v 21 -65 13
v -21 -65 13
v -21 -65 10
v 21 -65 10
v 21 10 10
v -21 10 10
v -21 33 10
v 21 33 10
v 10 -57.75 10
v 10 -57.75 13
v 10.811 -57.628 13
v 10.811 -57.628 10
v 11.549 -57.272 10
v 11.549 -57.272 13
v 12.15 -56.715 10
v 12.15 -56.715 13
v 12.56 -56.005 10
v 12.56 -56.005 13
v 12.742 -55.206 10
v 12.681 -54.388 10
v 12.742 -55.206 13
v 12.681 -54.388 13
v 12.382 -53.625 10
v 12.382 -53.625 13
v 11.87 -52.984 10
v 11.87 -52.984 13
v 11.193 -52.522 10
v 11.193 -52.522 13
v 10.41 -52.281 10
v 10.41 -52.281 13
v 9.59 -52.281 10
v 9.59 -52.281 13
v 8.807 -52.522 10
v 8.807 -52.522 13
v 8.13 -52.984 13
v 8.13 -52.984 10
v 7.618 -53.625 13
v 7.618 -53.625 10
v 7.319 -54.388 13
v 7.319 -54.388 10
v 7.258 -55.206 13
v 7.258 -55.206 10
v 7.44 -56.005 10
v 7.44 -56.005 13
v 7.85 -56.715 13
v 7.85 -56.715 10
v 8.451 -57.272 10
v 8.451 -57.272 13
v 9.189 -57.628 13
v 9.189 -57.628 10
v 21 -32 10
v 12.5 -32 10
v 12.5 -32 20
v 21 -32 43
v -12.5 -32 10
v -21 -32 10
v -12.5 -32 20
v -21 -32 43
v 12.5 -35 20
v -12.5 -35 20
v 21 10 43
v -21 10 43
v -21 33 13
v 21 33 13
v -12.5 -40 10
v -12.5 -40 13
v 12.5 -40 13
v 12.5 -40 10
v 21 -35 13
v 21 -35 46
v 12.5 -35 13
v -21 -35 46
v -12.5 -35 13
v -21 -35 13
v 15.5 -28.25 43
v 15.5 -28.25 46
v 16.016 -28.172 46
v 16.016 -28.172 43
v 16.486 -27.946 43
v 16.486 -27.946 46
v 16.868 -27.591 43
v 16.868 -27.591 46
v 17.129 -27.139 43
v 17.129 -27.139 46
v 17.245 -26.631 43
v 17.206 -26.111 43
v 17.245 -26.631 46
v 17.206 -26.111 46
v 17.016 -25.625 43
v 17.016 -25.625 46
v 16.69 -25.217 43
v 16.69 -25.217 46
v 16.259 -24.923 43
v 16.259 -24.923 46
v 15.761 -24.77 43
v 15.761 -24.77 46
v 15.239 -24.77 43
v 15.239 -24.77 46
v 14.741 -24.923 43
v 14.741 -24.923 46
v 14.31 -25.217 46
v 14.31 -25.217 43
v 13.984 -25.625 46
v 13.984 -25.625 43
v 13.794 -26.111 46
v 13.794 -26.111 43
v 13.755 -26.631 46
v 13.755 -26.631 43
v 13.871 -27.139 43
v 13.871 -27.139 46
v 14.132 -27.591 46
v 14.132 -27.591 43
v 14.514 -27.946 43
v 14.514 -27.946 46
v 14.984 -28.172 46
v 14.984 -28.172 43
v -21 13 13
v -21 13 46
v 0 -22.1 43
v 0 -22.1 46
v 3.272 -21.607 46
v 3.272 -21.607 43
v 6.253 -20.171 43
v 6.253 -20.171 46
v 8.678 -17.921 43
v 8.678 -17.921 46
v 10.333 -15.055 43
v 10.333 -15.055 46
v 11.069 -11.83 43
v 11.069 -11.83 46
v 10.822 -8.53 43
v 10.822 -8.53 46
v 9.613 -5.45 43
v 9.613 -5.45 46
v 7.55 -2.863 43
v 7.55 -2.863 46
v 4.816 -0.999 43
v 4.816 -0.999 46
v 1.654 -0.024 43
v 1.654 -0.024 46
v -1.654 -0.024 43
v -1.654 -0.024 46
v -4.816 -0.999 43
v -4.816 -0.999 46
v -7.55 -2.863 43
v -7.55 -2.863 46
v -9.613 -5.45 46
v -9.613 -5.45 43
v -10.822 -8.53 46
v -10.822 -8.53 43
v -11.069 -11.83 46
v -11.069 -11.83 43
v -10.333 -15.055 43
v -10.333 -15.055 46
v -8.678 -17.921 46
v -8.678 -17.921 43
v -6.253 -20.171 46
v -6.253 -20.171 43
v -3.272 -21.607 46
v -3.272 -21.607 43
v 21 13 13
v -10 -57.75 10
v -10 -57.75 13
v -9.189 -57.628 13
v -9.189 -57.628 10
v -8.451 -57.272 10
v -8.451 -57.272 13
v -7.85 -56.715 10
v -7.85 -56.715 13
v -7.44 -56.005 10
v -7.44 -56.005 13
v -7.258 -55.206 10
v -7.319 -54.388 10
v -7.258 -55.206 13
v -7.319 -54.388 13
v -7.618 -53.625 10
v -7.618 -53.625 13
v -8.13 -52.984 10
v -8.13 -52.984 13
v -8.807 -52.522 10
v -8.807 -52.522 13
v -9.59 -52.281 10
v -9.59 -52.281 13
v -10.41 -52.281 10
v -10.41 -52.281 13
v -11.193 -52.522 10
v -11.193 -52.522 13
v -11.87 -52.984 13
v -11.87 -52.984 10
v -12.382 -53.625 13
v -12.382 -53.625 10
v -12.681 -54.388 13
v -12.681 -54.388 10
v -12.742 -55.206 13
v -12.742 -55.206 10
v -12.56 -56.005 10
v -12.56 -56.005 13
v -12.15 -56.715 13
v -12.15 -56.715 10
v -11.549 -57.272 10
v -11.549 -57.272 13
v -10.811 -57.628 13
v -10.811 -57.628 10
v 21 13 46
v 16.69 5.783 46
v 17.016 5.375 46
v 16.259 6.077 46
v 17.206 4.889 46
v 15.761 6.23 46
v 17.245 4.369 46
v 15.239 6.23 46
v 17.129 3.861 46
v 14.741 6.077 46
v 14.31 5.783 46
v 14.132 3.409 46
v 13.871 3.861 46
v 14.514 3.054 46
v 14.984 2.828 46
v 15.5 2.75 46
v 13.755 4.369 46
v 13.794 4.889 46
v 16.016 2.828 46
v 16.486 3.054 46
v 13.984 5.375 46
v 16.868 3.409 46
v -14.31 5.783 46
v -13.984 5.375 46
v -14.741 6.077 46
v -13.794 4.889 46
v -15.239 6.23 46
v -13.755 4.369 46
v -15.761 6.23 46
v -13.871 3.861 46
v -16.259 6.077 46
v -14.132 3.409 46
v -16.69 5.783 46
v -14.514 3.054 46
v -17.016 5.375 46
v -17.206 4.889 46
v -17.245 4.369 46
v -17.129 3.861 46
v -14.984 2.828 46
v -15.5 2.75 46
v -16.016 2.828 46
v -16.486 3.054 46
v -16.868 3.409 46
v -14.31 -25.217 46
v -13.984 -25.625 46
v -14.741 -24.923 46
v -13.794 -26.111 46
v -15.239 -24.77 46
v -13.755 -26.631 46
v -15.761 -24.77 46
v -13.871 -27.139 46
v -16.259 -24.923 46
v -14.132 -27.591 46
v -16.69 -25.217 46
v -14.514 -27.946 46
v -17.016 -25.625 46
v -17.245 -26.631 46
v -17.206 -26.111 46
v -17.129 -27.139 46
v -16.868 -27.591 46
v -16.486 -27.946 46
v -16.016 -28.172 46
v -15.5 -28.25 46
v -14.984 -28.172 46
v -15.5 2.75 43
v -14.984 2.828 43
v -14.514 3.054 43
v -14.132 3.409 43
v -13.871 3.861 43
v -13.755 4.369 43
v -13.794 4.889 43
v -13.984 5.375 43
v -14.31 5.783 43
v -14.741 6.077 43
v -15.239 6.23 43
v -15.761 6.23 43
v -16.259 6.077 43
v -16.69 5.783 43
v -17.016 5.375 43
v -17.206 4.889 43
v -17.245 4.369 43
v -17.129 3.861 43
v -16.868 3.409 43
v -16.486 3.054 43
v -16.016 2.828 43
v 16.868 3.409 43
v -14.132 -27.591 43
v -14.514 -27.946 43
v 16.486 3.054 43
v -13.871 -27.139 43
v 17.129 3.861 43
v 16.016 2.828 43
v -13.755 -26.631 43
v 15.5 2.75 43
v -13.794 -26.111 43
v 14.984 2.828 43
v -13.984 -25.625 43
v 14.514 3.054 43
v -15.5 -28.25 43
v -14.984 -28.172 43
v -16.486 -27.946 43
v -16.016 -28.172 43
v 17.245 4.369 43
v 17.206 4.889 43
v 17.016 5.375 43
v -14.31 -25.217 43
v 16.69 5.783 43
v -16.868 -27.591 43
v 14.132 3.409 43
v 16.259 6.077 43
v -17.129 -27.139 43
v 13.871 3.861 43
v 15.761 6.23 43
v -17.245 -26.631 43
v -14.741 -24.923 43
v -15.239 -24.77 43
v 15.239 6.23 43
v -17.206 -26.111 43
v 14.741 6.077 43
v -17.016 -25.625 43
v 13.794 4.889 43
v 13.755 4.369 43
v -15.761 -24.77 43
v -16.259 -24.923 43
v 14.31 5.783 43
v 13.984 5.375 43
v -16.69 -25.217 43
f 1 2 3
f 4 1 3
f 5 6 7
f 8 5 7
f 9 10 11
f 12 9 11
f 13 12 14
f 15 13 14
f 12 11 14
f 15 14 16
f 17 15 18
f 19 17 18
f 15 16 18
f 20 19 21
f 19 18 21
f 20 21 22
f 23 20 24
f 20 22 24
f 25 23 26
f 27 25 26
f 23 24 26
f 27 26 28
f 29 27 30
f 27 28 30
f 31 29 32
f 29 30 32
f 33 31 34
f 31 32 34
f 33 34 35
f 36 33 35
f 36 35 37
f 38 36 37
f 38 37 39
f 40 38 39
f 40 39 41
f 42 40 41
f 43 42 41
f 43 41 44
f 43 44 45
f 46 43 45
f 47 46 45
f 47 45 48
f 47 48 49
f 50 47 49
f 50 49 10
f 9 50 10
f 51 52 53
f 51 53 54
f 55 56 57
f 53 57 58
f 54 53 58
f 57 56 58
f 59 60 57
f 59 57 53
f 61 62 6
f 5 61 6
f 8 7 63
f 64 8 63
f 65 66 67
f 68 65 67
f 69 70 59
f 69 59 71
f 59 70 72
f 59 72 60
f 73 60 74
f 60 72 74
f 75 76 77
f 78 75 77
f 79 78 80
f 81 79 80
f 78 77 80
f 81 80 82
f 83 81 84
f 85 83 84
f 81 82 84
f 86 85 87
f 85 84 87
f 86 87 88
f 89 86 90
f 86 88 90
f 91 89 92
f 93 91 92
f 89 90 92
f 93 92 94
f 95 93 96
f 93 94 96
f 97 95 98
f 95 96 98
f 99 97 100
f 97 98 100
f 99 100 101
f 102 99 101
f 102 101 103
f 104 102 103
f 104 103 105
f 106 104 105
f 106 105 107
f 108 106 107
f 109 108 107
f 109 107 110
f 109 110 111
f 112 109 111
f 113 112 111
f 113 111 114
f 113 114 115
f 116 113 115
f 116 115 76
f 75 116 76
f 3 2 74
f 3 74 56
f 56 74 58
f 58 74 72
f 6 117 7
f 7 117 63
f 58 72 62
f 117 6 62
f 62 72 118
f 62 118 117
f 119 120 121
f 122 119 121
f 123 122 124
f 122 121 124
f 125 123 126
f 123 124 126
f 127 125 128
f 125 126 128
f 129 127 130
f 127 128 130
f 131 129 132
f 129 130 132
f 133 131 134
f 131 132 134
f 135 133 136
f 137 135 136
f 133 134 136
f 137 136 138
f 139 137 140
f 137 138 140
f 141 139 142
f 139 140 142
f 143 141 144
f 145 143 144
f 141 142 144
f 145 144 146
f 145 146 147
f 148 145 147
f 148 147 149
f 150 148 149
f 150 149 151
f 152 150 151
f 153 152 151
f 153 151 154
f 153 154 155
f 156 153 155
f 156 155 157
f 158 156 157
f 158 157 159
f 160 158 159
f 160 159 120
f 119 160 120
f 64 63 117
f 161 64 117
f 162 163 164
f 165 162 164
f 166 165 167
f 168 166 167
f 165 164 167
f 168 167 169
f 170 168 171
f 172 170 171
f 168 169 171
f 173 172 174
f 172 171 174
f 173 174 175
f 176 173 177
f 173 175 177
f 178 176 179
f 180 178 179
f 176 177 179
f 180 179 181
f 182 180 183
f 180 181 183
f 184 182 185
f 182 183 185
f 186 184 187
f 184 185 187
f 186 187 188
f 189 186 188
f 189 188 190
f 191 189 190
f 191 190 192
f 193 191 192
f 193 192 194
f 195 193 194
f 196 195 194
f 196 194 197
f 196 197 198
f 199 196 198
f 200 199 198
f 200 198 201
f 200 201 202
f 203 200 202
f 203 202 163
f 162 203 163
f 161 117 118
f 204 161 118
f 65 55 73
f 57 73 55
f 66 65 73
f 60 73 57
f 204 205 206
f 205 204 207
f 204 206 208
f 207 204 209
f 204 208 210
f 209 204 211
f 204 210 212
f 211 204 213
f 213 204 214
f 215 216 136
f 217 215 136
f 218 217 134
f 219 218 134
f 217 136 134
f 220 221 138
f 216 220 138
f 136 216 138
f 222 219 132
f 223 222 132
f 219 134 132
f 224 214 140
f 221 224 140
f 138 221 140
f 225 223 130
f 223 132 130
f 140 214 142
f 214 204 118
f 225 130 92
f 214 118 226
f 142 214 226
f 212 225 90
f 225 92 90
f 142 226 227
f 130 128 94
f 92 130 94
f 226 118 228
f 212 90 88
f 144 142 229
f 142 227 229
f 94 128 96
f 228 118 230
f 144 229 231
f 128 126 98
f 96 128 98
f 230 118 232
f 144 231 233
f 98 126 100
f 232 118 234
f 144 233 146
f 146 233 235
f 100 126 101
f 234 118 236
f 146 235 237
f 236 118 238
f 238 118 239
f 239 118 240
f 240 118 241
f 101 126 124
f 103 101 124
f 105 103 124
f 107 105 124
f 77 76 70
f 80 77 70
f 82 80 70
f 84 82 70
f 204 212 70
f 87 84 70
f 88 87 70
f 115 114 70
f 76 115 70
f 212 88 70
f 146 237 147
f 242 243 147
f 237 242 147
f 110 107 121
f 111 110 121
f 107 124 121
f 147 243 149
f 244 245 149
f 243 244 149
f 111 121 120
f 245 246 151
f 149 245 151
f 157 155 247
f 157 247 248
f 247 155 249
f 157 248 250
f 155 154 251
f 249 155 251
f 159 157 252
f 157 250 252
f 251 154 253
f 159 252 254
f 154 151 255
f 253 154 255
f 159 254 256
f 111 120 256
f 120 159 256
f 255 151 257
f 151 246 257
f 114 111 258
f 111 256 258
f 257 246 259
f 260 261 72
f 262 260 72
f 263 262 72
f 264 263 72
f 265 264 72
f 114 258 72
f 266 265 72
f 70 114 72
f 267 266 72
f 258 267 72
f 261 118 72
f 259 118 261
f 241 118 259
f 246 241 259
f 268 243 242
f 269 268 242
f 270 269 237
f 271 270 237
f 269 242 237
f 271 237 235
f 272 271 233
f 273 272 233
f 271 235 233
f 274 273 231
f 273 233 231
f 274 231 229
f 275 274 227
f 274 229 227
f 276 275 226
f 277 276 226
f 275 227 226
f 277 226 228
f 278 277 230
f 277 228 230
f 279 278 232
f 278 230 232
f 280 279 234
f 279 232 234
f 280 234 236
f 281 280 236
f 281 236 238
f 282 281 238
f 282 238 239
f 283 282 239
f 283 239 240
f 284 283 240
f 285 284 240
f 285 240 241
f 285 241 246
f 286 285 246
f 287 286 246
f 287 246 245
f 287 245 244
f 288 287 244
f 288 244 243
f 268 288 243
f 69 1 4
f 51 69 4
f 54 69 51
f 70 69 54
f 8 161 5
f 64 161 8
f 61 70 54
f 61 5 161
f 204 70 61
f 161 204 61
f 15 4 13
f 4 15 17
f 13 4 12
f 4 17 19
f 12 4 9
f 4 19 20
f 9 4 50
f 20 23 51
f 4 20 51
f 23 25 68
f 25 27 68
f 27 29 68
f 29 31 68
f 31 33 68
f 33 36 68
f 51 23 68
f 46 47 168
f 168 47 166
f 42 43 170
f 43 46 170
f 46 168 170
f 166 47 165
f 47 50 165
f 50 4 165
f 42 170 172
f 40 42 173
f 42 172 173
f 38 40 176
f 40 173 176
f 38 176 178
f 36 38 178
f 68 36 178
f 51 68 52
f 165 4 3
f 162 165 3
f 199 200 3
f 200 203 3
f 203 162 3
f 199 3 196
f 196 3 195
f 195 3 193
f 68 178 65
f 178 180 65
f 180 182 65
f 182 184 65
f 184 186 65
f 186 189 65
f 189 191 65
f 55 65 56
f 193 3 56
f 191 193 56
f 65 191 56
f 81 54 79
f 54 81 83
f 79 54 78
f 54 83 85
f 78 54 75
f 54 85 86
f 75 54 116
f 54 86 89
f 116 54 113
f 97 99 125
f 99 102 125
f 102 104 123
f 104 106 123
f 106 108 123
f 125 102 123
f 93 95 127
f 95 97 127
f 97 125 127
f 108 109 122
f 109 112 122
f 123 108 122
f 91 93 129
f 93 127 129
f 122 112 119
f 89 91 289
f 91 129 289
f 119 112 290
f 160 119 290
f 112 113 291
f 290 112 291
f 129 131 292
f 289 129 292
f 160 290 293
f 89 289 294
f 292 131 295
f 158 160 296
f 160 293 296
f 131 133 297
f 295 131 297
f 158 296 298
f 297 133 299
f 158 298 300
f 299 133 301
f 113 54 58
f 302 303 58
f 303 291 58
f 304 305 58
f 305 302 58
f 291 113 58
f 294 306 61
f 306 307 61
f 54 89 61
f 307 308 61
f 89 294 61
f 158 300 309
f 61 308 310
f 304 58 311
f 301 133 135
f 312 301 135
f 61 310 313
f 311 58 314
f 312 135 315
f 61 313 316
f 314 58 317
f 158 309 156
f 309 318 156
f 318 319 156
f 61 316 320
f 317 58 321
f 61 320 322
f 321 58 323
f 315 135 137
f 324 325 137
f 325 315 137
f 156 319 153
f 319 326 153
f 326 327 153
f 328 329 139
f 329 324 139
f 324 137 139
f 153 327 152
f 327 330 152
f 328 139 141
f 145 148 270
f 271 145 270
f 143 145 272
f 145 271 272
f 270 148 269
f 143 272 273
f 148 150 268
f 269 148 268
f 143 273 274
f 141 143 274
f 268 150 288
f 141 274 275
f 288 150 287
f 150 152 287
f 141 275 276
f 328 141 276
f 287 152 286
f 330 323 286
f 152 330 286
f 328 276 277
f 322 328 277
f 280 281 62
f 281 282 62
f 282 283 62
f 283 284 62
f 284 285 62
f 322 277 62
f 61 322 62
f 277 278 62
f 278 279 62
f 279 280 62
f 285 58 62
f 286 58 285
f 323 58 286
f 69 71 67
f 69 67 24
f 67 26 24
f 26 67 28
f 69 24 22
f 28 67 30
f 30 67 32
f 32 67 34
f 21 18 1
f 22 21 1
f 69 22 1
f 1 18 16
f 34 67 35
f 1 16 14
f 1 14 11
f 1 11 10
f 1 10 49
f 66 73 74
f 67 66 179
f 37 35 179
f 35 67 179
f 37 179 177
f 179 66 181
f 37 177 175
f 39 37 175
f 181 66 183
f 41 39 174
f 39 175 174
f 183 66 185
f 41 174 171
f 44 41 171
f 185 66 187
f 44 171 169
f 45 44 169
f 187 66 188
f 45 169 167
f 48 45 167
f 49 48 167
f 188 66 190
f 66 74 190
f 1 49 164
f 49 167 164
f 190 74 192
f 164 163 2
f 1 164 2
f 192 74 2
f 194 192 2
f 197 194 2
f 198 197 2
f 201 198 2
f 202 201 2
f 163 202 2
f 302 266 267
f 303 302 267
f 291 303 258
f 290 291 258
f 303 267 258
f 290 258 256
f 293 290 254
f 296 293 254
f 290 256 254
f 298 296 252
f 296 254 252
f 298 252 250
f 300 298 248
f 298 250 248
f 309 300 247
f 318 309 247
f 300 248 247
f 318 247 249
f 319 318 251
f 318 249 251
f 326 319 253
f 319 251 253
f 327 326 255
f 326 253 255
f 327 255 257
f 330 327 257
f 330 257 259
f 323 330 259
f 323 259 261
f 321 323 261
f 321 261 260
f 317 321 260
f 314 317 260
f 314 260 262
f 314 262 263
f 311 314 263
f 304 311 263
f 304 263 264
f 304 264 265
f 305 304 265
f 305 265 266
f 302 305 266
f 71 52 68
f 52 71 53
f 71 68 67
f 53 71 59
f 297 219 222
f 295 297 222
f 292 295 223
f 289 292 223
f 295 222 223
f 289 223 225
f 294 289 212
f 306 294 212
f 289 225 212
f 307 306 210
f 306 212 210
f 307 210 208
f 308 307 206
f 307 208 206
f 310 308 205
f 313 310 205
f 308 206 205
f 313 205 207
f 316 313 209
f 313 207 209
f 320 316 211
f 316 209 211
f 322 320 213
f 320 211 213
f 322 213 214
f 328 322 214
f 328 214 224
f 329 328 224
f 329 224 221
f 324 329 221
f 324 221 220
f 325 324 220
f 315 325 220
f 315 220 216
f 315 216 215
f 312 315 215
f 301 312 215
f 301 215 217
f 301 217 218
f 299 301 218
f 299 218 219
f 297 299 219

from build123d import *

# Parameters (mm, degrees)
PAD044_DEPTH    = 42
SKETCH127_R     = 1.75
SKETCH127_R_2   = 11.1
POCKET039_DEPTH = 36.001
SKETCH128_R     = 2.75
HOLE027_DEPTH   = 25
SKETCH130_W     = 25
SKETCH130_H     = 10
POCKET040_DEPTH = 13


with BuildPart() as part:
    # Sketch124 → Pad044 (new body)
    with BuildSketch(Plane.YZ):
        Polygon((-32, 10), (-32, 43), (10, 43), (10, 10), (33, 10), (33, 13), (13, 13), (13, 46), (-35, 46), (-35, 13), (-65, 13), (-65, 10), align=None)
    extrude(amount=PAD044_DEPTH)

    # Sketch127 (on Face8 of Pad044) → Pocket039 (cut, through all)
    with BuildSketch(Plane(origin=(0, 0, 46), x_dir=(0, -1, 0), z_dir=(0, 0, 1))):
        with Locations((-4.5, 36.5)):
            Circle(SKETCH127_R)
        with Locations((-4.5, 5.5)):
            Circle(SKETCH127_R)
        with Locations((26.5, 36.5)):
            Circle(SKETCH127_R)
        with Locations((26.5, 5.5)):
            Circle(SKETCH127_R)
        with Locations((11, 21)):
            Circle(SKETCH127_R_2)
    extrude(amount=-POCKET039_DEPTH, mode=Mode.SUBTRACT)

    # Sketch128 (on Face19 of Pocket039) → Hole027 (cut)
    with BuildSketch(Plane(origin=(0, 0, 13), x_dir=(0, -1, 0), z_dir=(0, 0, 1))):
        with Locations((55, 31)):
            Circle(SKETCH128_R)
        with Locations((55, 11)):
            Circle(SKETCH128_R)
    extrude(amount=-HOLE027_DEPTH, mode=Mode.SUBTRACT)

    # Sketch130 → Pocket040 (cut)
    with BuildSketch(Plane.XZ.offset(40)):
        with Locations((21, 15)):
            Rectangle(SKETCH130_W, SKETCH130_H)
    extrude(amount=-POCKET040_DEPTH, mode=Mode.SUBTRACT)


with BuildPart() as part_1:
    # Body019 placement: moved
    add(part.part.moved(Location((-21, 0, 0))))


solid = part_1.part
